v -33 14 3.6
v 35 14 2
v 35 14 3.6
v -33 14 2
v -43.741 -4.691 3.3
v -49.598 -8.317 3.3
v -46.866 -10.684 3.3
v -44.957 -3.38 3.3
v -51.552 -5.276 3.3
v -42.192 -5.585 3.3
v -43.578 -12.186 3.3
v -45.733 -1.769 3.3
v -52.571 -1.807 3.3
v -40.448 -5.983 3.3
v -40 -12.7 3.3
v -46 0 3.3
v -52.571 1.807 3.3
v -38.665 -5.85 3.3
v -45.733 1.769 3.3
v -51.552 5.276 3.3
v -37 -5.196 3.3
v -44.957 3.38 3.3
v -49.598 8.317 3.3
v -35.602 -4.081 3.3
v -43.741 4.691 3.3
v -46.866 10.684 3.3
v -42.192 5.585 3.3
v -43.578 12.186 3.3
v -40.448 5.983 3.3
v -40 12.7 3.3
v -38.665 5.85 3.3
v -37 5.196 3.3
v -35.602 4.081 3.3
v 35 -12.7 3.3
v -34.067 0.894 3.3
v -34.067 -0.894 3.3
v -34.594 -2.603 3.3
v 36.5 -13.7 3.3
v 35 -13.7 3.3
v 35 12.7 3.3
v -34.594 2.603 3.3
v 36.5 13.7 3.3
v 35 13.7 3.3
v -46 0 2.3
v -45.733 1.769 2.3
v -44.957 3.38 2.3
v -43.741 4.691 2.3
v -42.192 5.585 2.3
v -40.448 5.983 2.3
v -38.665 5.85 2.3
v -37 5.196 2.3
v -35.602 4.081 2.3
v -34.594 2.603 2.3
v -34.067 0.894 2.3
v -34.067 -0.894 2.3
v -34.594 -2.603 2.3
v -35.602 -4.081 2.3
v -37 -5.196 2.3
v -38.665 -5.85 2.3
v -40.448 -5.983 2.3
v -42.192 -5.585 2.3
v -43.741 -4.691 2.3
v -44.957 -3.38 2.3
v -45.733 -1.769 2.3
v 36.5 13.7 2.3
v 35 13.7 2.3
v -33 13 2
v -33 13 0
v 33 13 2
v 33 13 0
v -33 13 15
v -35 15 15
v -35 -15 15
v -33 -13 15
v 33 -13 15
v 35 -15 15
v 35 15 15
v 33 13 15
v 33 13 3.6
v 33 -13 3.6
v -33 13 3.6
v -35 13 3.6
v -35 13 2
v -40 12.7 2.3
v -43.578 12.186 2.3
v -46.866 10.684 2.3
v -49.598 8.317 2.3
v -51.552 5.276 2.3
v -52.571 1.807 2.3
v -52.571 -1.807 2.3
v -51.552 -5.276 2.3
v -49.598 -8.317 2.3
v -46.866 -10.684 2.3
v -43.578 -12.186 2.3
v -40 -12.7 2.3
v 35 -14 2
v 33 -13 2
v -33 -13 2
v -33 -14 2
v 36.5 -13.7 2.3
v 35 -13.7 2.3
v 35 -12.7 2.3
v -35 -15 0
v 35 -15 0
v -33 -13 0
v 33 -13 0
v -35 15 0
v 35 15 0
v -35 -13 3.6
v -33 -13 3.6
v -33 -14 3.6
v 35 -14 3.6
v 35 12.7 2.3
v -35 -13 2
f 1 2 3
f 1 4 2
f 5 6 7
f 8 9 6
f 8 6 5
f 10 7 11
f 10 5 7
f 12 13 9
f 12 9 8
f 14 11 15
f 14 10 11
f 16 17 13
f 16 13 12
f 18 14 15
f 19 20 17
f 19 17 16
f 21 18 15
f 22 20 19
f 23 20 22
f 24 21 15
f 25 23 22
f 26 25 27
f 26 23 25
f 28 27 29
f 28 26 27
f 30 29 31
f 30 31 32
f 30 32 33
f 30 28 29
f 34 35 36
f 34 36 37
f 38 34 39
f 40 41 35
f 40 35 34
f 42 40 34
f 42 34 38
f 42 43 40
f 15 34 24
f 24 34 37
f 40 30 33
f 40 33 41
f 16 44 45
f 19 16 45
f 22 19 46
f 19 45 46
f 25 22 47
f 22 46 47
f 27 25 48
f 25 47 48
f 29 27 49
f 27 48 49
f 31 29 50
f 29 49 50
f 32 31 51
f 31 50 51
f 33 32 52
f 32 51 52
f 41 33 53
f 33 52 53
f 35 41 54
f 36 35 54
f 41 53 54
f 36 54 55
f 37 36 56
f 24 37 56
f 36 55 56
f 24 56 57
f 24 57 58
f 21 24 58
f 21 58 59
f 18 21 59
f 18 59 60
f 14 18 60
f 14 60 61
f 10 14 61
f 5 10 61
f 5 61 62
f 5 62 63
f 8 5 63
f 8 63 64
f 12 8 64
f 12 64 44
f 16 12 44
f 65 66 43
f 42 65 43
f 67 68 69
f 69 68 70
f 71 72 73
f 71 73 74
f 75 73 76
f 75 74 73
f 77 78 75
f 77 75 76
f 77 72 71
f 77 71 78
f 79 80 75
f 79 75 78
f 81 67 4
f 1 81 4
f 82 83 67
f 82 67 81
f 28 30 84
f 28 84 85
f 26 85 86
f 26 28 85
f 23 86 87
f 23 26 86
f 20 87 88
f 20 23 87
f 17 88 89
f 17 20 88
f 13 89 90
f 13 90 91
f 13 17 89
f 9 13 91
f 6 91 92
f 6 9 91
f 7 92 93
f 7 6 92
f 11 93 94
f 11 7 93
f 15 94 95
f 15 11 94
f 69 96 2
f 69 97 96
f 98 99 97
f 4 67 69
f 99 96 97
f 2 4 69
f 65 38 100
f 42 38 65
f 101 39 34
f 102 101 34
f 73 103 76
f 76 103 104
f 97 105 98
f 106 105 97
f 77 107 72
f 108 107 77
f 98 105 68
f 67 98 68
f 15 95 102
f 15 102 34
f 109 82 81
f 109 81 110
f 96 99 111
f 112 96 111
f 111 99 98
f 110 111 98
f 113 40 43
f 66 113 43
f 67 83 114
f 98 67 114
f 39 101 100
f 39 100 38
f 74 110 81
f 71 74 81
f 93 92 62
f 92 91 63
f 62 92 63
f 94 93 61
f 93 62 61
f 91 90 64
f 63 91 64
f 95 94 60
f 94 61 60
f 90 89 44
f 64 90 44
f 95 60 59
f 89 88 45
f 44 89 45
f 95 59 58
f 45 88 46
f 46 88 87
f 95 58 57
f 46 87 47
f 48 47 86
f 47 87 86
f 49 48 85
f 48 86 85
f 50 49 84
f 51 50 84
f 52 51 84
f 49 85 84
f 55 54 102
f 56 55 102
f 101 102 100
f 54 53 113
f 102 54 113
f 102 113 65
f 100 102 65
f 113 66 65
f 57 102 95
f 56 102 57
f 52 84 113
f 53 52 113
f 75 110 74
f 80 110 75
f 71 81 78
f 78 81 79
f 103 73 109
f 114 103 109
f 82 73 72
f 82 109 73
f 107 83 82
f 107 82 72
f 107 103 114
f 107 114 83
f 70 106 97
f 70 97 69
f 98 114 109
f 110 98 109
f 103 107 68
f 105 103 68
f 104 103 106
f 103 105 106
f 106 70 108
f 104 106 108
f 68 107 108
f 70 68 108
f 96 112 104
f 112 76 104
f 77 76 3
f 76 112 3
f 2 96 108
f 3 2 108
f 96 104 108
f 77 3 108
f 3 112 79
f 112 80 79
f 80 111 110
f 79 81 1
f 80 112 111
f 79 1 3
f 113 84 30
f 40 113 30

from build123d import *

# Parameters (mm, degrees)
F0_W          = 70
F0_H          = 30
F0_W_2        = 66
F0_H_2        = 26
F1_DEPTH      = 15
F2_W          = 28
F2_H          = 1.6
F3_DEPTH      = 33
F3_DEPTH_BACK = 35
F4_W          = 26
F4_H          = 1.6
F5_DEPTH      = 2
F6_W          = 25.4
F6_H          = 1
F7_DEPTH      = 70
F7_DEPTH_BACK = 5
F8_W          = 1
F8_H          = 1
F8_W_2        = 25.4
F9_DEPTH      = 1.5
F11_DEPTH     = 1
F12_D         = 12


with BuildPart() as f1:
    # F0 (on Top) → F1 (new body)
    with BuildSketch(Plane.XY):
        Rectangle(F0_W, F0_H)
        Rectangle(F0_W_2, F0_H_2, mode=Mode.SUBTRACT)
    extrude(amount=F1_DEPTH)

    # F2 (on Right) → F3 (cut, two sides)
    with BuildSketch(Plane.YZ) as f3_sk:
        with Locations((0, 2.8)):
            Rectangle(F2_W, F2_H)
    extrude(amount=-F3_DEPTH, mode=Mode.SUBTRACT)
    extrude(f3_sk.sketch, amount=F3_DEPTH_BACK, mode=Mode.SUBTRACT)

    # F4 (on face) → F5 (cut, through all)
    with BuildSketch(Plane(origin=(-35, 0, 0), x_dir=(0, -1, 0), z_dir=(-1, 0, 0))):
        with Locations((0, 2.8)):
            Rectangle(F4_W, F4_H)
    extrude(amount=-F5_DEPTH, mode=Mode.SUBTRACT)


with BuildPart() as f7:
    # F6 (on face) → F7 (new body, two sides)
    with BuildSketch(Plane(origin=(-35, 0, 0), x_dir=(0, -1, 0), z_dir=(-1, 0, 0))) as f7_sk:
        with Locations((0, 2.8)):
            Rectangle(F6_W, F6_H)
    extrude(amount=-F7_DEPTH)
    extrude(f7_sk.sketch, amount=F7_DEPTH_BACK)

    # F8 (on face) → F9 (join)
    with BuildSketch(Plane.YZ.offset(35)):
        with Locations((-13.2, 2.8)):
            Rectangle(F8_W, F8_H)
        with Locations((13.2, 2.8)):
            Rectangle(F8_W, F8_H)
        with Locations((0, 2.8)):
            Rectangle(F8_W_2, F8_H)
    extrude(amount=F9_DEPTH)

    # F10 (on face) → F11 (join, through all)
    with BuildSketch(Plane.XY.offset(3.3)):
        with BuildLine():
            Line((-40, -12.7), (-40, 12.7))
            ThreePointArc((-40, 12.7), (-52.7, 0), (-40, -12.7))
        make_face()
    extrude(amount=-F11_DEPTH)

    # F12 (through all)
    with Locations(Plane.XY.offset(3.3)):
        with Locations((-40, 0)):
            Hole(F12_D / 2)


solid = Compound([f1.part, f7.part])
